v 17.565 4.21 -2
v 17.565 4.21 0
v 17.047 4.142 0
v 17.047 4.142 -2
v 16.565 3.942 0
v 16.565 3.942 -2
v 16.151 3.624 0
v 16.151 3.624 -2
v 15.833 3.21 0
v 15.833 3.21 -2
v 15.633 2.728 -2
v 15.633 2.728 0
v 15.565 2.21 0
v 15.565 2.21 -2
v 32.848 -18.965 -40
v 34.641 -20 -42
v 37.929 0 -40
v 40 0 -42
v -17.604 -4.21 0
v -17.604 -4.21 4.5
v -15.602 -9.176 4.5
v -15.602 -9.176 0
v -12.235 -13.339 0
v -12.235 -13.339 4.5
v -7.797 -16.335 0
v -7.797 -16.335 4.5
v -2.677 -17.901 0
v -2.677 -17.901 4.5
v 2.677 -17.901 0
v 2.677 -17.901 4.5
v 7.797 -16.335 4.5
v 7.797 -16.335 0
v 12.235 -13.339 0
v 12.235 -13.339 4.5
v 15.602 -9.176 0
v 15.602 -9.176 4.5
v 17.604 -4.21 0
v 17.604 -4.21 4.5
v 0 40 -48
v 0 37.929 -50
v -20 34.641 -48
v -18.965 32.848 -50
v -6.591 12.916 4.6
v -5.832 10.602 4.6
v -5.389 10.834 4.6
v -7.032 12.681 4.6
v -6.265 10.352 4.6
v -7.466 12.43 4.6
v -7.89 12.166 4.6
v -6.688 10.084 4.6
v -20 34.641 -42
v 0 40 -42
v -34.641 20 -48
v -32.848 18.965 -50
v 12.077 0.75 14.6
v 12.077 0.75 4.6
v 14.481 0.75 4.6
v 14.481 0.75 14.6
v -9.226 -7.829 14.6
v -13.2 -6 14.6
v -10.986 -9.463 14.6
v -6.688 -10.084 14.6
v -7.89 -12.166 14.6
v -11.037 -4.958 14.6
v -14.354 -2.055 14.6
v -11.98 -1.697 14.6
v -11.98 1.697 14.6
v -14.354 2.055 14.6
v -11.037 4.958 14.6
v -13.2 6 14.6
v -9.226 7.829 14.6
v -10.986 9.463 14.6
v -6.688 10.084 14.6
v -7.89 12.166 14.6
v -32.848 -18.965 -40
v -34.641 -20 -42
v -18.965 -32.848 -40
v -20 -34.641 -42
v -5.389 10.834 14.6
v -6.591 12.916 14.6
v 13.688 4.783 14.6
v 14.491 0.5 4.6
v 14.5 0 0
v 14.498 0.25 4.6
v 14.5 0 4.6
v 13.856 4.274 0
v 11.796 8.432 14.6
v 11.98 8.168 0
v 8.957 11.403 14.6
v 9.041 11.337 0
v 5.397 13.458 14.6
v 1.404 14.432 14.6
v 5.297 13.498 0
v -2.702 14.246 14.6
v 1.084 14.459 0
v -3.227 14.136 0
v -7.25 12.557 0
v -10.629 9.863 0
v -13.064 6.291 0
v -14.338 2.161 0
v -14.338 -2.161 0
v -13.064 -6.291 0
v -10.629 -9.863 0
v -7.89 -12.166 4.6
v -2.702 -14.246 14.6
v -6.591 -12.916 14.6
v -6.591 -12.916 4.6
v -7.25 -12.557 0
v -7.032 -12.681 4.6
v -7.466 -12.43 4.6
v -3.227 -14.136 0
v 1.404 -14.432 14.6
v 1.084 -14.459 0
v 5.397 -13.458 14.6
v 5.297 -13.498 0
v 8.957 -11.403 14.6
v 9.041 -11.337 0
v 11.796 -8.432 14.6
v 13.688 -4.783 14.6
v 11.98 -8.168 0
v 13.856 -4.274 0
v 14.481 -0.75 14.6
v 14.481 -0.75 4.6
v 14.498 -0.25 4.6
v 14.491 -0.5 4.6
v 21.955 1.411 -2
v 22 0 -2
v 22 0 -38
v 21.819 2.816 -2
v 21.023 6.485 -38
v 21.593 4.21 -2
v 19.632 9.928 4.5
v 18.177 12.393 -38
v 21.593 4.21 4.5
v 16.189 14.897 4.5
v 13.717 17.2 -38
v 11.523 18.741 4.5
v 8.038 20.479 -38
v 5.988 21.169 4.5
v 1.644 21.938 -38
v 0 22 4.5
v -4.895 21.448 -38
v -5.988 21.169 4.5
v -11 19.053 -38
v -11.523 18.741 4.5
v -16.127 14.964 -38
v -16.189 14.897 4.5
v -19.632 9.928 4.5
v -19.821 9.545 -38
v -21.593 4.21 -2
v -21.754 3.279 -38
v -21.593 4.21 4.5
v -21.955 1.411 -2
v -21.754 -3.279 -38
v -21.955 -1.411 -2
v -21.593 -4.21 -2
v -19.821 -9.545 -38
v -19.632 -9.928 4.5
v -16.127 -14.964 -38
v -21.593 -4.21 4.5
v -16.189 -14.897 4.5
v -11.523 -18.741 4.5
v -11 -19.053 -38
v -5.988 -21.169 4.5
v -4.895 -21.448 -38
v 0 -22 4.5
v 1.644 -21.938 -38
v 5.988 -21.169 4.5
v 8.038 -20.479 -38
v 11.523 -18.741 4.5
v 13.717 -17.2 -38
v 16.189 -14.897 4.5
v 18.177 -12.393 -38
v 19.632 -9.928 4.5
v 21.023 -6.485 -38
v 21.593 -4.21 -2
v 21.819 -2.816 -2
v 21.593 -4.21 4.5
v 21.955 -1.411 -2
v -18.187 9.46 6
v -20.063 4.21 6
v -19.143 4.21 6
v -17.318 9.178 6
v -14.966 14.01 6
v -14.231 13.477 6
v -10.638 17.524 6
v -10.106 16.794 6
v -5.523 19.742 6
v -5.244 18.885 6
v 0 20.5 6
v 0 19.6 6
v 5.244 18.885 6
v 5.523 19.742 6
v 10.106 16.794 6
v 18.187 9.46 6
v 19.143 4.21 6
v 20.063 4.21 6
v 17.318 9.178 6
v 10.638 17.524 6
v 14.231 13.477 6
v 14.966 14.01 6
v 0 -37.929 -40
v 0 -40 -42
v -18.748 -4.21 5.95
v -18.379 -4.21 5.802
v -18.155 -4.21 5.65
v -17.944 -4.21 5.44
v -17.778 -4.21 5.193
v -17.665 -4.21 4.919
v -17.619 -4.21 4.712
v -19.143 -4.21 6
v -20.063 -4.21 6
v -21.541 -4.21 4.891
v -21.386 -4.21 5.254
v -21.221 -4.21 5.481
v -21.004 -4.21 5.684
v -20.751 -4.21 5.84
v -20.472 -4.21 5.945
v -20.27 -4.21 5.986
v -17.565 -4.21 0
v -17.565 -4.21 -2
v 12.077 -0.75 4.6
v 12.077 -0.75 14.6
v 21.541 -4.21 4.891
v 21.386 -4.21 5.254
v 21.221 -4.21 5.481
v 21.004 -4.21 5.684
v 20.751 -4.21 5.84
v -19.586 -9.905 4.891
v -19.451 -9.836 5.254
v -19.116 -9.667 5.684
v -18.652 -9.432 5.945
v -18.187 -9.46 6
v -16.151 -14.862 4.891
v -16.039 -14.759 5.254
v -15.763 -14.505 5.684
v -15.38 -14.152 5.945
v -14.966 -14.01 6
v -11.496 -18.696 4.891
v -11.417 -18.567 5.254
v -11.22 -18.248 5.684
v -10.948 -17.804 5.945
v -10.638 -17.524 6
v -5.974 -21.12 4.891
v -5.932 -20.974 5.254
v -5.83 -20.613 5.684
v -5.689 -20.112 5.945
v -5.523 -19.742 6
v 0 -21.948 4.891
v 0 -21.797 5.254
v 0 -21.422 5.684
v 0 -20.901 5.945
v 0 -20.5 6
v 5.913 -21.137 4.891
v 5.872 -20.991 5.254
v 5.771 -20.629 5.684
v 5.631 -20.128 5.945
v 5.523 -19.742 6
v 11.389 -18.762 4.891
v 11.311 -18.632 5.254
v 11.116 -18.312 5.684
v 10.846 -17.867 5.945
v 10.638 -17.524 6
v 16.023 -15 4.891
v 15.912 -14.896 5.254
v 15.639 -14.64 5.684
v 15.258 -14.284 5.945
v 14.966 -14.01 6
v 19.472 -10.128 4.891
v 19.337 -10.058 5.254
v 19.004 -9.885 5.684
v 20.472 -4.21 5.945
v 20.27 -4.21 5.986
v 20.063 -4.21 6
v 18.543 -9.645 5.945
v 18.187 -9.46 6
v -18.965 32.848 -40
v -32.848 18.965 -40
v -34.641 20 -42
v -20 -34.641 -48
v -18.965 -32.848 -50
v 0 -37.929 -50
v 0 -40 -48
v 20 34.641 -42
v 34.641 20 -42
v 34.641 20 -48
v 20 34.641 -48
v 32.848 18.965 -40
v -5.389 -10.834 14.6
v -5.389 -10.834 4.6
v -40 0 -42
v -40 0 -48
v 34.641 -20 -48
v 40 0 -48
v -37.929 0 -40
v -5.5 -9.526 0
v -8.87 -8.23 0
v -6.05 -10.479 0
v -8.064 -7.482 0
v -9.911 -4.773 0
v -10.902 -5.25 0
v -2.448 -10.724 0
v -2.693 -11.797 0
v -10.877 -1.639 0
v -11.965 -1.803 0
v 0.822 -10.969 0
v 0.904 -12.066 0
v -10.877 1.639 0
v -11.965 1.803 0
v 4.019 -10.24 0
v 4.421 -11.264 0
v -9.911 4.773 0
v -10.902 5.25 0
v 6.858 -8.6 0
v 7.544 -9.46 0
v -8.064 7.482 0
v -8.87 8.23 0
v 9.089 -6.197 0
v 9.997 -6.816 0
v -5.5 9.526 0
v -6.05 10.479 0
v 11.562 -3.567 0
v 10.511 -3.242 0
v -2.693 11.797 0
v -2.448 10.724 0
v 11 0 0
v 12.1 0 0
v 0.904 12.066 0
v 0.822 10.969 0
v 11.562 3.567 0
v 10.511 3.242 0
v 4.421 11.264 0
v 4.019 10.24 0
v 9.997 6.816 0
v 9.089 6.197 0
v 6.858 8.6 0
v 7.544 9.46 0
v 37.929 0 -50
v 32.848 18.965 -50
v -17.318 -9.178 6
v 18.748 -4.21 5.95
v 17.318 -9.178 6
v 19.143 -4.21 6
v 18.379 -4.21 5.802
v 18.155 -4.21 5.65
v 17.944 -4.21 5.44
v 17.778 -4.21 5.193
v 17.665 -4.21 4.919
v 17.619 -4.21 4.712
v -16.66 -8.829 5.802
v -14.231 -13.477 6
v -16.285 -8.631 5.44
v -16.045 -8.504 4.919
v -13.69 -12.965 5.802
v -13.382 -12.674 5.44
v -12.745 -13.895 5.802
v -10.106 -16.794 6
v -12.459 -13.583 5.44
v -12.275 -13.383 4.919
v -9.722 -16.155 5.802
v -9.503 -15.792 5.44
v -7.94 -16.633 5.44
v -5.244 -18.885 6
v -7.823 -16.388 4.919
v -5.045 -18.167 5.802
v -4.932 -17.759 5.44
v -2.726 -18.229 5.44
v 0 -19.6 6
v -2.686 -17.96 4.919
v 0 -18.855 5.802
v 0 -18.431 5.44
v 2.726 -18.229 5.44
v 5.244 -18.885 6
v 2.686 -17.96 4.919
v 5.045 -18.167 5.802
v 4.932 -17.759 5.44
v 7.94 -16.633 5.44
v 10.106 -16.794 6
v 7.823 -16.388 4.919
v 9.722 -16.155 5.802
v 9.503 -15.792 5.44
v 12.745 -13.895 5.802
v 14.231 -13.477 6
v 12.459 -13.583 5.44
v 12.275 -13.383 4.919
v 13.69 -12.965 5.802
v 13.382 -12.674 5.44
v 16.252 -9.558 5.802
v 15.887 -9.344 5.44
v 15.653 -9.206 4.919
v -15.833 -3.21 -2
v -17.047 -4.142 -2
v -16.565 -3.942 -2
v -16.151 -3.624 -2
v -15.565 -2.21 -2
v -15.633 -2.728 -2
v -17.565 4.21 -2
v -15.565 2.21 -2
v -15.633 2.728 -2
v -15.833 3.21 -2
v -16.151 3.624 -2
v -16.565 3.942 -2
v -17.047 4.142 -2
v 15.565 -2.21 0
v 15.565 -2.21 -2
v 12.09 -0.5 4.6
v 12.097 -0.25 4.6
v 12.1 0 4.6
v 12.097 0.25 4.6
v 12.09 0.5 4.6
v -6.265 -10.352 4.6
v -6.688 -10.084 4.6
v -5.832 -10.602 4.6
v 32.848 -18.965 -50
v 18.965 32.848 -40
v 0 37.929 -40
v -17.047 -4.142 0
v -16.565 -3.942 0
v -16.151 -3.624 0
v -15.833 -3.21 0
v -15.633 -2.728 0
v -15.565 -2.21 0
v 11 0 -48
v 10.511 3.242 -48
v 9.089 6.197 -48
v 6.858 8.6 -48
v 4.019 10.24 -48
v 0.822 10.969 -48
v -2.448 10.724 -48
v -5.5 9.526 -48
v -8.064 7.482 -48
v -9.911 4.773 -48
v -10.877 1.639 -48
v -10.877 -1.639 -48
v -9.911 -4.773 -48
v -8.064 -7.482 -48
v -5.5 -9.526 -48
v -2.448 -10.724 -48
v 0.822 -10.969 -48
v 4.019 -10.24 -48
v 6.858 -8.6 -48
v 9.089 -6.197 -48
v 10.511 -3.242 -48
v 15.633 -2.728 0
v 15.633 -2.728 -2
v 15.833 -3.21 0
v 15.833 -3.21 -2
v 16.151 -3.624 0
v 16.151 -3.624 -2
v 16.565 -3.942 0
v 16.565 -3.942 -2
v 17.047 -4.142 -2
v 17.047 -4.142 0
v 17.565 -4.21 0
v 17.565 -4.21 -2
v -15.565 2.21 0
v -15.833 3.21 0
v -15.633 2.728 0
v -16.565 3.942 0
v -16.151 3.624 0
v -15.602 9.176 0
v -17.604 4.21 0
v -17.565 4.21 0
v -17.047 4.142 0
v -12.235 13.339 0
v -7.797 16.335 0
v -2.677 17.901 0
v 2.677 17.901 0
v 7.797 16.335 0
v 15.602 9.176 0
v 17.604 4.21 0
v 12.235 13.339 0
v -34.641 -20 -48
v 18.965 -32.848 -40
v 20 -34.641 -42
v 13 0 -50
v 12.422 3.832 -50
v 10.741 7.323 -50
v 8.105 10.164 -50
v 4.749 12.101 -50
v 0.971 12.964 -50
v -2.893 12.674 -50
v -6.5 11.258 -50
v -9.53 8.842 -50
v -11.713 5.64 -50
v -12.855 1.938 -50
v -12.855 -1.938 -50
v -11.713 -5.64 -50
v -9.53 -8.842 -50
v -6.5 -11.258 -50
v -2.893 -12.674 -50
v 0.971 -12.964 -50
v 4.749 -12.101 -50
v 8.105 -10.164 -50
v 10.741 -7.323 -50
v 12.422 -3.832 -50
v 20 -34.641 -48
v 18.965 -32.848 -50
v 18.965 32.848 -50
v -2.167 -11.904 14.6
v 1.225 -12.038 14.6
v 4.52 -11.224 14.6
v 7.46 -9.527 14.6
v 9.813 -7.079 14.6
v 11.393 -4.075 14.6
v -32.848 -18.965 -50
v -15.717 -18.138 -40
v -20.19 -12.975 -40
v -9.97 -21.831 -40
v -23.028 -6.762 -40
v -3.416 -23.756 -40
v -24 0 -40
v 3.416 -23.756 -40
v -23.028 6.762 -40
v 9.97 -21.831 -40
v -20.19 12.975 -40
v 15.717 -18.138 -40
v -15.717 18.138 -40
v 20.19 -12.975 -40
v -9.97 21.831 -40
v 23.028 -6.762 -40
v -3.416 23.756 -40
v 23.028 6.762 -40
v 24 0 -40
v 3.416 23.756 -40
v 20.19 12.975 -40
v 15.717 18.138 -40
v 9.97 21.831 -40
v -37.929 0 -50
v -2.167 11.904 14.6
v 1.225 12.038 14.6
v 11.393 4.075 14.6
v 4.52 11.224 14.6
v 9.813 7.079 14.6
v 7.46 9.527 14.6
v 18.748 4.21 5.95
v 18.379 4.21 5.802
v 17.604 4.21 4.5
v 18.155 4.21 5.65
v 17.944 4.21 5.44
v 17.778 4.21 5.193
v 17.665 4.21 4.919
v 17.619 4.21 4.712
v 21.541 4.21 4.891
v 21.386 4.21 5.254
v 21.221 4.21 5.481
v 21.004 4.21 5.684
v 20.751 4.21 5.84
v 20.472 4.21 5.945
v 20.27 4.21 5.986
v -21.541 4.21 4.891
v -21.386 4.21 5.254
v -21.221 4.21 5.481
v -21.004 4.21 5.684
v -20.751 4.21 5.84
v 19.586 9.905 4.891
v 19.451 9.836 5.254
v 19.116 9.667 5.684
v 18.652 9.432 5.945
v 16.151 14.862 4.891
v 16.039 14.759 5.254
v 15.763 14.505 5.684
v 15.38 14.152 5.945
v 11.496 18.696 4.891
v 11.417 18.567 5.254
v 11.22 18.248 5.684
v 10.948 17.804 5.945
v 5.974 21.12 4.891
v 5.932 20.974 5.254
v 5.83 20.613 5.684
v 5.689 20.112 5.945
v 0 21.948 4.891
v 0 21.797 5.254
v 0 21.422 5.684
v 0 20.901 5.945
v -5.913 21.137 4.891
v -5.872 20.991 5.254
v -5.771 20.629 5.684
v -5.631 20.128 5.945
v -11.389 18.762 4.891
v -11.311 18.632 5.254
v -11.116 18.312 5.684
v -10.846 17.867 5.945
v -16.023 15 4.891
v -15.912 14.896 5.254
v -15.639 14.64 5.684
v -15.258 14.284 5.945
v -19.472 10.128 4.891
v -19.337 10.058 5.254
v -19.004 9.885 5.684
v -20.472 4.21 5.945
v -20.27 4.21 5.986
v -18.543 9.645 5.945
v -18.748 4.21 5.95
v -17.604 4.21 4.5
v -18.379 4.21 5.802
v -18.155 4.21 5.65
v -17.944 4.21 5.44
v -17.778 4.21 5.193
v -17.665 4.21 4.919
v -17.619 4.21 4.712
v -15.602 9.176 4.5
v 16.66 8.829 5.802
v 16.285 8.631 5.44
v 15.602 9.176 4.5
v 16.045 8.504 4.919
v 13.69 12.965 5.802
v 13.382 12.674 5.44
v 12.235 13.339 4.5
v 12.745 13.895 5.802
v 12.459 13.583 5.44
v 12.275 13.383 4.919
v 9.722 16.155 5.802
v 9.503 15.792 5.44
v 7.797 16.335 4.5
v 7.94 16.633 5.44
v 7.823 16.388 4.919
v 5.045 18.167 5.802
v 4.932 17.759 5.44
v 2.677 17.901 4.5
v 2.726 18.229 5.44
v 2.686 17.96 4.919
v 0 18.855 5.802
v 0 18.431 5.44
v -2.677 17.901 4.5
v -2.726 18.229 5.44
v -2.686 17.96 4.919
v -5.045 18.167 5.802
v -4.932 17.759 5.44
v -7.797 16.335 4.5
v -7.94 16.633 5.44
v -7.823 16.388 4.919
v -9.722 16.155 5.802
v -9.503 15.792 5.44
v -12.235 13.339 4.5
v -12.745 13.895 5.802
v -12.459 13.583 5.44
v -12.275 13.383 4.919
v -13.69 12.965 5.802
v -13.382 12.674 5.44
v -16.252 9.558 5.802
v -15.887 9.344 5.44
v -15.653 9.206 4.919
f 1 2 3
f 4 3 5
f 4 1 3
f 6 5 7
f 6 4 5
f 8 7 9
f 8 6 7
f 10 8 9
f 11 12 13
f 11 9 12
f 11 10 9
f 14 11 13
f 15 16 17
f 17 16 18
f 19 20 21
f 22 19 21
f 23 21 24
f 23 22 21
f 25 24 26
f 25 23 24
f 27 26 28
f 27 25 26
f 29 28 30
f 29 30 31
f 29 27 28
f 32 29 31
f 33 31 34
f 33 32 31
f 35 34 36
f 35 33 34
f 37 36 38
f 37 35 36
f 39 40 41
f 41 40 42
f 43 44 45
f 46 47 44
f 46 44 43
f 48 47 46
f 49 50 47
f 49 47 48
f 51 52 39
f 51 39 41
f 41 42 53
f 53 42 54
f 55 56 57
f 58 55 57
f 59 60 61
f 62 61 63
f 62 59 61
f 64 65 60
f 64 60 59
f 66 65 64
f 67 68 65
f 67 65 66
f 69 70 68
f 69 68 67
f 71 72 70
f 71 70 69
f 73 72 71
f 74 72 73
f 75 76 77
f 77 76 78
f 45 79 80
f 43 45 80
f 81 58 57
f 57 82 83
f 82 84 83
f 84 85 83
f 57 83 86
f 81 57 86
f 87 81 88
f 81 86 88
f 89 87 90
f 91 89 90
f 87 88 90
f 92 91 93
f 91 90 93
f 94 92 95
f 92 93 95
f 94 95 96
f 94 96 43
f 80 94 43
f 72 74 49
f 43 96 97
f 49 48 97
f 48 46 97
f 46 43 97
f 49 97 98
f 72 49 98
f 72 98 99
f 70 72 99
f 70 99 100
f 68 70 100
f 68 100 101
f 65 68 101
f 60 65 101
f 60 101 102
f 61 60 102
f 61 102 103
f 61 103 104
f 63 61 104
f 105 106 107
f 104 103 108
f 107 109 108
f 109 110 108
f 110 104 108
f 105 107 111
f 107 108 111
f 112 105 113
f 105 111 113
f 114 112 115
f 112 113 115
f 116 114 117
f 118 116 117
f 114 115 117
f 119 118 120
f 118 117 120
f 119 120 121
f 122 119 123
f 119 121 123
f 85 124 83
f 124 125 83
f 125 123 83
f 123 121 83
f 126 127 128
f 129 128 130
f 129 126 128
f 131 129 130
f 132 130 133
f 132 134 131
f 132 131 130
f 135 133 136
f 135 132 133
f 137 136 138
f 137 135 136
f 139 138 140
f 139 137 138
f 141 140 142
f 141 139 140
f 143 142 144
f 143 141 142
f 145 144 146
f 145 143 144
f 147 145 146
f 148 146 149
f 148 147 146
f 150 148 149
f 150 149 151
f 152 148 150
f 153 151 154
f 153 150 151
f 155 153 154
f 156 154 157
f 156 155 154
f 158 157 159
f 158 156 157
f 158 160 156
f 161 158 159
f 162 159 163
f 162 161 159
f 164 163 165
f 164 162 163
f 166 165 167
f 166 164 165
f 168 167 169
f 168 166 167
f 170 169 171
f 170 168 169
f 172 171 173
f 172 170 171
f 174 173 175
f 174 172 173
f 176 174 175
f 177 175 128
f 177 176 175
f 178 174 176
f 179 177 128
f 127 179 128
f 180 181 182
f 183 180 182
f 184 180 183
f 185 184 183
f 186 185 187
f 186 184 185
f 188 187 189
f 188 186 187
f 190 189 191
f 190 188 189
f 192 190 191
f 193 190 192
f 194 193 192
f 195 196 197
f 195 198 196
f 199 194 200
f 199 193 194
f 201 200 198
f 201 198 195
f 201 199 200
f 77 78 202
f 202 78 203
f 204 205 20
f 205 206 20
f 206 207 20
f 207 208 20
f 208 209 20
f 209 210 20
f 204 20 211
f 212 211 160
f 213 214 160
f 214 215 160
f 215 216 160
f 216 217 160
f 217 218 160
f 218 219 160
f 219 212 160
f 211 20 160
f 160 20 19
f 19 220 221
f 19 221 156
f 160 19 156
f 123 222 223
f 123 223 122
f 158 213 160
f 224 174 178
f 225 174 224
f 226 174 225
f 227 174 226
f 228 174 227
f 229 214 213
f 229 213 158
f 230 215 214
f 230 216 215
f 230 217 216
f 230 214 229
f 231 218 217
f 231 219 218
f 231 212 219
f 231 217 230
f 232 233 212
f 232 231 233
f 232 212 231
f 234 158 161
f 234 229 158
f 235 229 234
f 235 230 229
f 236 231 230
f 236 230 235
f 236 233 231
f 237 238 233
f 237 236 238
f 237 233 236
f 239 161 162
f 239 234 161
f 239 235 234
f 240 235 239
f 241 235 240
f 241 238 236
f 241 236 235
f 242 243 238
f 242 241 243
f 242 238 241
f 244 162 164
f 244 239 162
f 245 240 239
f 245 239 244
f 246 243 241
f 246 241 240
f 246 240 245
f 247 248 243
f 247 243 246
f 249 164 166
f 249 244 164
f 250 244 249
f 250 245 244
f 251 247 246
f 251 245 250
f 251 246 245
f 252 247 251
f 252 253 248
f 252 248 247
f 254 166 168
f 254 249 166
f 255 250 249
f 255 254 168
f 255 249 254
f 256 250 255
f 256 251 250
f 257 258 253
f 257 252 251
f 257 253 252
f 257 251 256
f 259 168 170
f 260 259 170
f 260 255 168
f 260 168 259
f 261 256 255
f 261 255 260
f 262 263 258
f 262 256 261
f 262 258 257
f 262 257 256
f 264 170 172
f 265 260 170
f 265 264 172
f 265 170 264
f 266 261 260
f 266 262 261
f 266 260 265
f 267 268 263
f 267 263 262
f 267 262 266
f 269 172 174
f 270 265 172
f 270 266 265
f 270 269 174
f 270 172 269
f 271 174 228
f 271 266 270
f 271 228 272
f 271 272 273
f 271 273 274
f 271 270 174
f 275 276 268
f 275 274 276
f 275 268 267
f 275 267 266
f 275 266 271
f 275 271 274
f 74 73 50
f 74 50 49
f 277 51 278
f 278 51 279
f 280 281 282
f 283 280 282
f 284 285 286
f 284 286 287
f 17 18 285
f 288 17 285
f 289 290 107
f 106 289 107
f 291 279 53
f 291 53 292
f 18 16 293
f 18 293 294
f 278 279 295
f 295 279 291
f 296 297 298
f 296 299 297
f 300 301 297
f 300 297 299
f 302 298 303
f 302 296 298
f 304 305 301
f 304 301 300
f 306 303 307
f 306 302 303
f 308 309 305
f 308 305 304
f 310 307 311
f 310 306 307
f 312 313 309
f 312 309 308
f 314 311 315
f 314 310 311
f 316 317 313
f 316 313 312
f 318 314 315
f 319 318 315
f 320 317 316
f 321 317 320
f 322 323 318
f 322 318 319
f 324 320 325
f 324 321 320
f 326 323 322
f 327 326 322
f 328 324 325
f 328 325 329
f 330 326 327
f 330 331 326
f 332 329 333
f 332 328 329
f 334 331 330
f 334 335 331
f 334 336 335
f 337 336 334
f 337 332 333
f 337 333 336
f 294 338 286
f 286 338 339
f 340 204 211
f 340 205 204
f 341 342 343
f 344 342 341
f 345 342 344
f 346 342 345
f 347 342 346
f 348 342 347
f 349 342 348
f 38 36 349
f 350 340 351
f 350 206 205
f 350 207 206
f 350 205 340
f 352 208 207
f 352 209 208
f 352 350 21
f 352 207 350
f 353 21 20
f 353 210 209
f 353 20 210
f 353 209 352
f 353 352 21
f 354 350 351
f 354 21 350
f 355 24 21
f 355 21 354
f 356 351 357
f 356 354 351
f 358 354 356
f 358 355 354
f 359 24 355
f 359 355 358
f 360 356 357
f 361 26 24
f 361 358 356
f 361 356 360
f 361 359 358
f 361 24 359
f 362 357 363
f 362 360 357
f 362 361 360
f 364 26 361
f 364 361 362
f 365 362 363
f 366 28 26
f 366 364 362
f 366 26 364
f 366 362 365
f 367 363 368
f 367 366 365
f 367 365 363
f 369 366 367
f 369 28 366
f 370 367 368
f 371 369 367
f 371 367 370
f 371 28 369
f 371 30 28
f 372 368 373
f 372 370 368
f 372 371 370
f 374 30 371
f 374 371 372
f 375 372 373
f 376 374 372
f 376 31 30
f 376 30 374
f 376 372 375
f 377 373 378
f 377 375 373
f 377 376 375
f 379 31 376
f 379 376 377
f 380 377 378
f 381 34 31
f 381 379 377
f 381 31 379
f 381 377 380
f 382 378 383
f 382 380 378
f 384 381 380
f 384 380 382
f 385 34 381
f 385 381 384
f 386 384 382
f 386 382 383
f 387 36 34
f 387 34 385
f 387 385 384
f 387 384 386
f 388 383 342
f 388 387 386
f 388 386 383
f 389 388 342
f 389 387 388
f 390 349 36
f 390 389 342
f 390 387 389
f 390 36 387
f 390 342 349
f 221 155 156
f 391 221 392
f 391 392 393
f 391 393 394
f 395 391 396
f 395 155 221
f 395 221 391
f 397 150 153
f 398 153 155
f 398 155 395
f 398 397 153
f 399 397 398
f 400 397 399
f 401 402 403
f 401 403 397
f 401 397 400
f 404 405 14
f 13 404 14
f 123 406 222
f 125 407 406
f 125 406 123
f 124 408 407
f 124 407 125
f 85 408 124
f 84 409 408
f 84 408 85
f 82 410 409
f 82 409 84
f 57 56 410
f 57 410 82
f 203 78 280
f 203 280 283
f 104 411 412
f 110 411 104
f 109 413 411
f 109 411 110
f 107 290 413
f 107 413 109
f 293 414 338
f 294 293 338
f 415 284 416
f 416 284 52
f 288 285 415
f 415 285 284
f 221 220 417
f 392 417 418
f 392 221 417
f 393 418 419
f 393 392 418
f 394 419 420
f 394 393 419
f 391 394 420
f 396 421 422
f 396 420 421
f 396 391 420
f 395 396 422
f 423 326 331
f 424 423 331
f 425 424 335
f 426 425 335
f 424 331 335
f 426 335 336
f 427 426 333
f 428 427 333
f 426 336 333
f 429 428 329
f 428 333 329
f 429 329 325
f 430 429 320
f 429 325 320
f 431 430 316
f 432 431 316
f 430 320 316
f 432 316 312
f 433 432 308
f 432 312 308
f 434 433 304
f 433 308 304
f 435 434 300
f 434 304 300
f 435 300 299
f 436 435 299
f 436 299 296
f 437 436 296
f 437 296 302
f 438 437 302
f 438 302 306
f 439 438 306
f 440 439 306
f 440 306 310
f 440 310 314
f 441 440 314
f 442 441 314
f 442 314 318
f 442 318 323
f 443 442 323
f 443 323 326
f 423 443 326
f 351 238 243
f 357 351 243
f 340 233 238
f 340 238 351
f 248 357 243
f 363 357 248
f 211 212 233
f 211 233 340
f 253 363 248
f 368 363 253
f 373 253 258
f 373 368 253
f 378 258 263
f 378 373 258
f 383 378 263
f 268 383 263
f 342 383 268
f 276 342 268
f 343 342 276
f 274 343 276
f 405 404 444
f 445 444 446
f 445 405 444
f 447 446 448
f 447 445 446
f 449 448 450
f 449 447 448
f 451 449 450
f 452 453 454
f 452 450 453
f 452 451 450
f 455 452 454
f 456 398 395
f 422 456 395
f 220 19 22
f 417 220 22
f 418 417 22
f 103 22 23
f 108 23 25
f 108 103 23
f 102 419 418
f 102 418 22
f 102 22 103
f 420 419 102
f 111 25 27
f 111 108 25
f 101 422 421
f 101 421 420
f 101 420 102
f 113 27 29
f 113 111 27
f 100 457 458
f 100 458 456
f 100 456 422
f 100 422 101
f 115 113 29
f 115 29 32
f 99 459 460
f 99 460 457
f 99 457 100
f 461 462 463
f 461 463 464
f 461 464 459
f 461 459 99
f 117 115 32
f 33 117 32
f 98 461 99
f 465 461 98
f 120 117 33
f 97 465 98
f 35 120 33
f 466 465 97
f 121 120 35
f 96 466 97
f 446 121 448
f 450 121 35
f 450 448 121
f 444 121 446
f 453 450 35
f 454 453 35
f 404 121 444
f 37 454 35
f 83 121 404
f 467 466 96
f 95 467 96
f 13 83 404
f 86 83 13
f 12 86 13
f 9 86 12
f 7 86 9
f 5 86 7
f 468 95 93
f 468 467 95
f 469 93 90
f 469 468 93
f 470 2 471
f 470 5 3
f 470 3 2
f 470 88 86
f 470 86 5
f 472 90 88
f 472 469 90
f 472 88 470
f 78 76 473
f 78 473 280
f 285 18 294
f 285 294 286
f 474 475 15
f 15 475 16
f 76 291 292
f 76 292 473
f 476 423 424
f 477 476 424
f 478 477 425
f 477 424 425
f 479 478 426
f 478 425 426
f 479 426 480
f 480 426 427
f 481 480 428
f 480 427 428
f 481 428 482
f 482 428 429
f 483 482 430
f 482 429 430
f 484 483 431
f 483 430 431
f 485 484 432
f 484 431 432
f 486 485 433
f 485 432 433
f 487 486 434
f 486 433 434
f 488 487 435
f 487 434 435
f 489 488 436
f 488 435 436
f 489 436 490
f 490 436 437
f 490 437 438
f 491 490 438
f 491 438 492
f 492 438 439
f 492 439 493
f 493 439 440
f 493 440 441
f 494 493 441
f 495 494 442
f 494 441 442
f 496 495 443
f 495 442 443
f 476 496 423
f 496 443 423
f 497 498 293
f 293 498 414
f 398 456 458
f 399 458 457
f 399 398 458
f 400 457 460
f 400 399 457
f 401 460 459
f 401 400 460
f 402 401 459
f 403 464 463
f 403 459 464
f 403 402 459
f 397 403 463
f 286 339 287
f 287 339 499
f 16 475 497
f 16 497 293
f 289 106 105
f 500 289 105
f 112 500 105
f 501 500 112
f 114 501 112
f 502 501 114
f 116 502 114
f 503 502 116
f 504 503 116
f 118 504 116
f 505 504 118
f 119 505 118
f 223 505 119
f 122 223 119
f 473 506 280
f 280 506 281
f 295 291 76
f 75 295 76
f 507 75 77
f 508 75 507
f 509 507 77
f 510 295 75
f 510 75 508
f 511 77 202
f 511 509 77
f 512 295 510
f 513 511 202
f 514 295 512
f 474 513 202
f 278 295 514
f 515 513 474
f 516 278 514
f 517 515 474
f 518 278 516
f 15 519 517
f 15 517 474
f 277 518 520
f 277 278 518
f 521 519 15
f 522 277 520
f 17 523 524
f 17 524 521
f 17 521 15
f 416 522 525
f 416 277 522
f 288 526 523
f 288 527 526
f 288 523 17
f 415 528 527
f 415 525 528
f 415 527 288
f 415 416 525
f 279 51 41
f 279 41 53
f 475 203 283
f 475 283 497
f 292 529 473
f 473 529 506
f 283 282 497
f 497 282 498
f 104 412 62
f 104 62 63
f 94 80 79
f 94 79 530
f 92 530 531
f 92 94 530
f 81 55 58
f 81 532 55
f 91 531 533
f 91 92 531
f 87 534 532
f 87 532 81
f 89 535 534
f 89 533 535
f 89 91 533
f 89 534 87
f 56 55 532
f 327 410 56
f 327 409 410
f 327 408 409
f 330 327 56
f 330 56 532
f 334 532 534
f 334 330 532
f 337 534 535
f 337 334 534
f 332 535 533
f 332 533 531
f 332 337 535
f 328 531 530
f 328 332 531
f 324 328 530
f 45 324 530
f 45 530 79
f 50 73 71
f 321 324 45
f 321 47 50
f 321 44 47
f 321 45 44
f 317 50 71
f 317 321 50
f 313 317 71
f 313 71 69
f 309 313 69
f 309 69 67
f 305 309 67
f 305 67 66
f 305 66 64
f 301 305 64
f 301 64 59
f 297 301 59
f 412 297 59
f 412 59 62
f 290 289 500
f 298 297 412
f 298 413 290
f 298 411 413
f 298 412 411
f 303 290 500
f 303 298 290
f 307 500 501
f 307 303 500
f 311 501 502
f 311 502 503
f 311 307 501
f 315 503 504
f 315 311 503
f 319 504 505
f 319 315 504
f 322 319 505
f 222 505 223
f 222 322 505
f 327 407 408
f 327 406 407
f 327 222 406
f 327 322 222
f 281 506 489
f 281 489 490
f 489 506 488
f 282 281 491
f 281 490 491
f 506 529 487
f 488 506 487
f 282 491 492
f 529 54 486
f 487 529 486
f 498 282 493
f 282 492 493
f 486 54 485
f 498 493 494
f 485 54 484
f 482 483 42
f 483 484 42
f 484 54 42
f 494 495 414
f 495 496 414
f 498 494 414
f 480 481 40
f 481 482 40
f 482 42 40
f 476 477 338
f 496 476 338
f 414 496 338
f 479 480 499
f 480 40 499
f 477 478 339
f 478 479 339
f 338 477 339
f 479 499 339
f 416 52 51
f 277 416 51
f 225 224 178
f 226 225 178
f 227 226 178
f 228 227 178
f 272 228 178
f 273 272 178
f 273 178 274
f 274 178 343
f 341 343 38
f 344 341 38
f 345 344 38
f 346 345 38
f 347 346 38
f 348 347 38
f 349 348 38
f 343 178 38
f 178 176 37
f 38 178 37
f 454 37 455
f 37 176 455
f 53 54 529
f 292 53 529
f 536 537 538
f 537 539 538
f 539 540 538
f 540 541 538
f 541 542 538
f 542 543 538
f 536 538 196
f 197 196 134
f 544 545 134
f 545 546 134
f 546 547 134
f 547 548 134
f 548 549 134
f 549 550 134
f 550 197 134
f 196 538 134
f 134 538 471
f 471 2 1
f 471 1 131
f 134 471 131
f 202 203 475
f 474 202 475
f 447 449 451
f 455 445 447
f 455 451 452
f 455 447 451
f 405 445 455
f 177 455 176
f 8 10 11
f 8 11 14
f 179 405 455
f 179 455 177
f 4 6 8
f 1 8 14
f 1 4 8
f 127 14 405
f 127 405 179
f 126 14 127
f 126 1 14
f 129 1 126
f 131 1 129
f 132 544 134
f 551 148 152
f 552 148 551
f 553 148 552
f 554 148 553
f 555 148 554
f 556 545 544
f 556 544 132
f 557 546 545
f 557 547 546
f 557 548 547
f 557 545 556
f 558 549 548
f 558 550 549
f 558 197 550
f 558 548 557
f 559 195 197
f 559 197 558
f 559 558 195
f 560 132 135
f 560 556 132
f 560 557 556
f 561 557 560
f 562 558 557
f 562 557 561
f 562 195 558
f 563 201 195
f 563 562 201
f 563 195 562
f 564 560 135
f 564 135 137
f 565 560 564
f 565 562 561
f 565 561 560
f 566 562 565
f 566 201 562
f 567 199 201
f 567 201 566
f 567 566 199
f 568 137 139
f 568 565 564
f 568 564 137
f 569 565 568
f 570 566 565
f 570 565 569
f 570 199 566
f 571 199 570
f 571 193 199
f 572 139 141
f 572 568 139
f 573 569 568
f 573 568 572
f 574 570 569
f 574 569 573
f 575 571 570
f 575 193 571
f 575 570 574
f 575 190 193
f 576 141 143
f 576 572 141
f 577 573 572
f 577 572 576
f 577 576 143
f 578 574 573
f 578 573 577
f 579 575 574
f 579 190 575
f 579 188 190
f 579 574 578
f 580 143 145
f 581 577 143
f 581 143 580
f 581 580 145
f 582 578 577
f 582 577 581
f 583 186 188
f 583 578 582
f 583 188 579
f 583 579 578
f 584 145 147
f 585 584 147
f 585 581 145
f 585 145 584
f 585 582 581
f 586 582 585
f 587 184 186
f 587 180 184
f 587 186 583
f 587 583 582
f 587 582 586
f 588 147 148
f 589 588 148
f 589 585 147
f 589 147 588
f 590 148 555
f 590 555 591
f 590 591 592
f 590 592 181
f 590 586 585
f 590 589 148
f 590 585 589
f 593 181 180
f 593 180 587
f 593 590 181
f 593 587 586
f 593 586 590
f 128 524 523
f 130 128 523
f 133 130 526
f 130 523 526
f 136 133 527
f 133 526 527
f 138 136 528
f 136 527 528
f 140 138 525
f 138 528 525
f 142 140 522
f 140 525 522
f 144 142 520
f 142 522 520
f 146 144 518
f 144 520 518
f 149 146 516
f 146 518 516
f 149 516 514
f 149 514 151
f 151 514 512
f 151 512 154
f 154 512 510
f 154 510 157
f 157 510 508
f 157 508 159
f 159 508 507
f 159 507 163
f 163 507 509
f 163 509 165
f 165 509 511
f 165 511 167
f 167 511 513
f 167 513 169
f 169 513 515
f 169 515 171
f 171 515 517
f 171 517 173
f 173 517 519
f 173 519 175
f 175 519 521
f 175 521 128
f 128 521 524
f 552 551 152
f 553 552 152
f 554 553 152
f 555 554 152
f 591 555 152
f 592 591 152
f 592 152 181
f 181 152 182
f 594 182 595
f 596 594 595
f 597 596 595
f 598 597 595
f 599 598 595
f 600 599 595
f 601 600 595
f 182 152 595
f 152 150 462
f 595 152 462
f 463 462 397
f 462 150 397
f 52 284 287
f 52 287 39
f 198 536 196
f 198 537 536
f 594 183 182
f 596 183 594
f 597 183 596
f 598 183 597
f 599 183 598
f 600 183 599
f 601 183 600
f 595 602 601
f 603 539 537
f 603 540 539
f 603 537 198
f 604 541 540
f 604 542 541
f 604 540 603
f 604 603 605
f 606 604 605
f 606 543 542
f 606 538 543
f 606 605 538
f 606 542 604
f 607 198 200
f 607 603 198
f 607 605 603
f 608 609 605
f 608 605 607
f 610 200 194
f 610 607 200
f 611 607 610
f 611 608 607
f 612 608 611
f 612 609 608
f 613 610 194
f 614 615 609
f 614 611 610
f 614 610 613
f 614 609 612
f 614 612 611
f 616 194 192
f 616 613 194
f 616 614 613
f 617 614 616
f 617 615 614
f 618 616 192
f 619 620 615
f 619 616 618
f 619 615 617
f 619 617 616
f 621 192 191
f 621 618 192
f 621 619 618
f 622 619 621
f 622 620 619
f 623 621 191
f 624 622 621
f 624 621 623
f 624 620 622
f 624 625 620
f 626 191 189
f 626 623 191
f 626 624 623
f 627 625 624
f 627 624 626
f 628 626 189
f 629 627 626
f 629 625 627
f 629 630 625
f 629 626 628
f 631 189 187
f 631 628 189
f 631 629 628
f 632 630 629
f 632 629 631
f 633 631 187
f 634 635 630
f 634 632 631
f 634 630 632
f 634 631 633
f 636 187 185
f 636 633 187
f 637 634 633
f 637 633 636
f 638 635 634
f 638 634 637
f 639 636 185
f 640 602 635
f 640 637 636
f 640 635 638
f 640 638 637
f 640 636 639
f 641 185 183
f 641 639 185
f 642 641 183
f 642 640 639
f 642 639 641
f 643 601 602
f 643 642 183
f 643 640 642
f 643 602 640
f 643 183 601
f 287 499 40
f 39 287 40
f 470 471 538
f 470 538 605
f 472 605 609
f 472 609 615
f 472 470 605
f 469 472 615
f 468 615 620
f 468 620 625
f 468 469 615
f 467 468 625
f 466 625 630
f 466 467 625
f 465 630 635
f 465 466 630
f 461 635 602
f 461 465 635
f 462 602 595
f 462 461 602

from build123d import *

# Parameters (mm, degrees)
SKETCH_R             = 14.5
SKETCH_R_2           = 12.1
PAD_DEPTH            = 14.6
SKETCH001_W          = 30.380329
SKETCH001_H          = 1.5
POCKET_DEPTH         = 97.067871
POLARPATTERN_COUNT   = 3
SKETCH003_R          = 22
PAD001_DEPTH         = 40
SKETCH004_R          = 22
SKETCH004_R_2        = 18.1
PAD002_DEPTH         = 6
PAD003_DEPTH         = 10
SKETCH005_R          = 11
POCKET001_DEPTH      = 50.001
POCKET001_DEPTH_BACK = 14.601
FILLET_R             = 1.5
POCKET002_DEPTH      = 16.601
CHAMFER_SIZE         = 2


with BuildPart() as part:
    # Sketch → Pad (new body)
    with BuildSketch(Plane.XY):
        Circle(SKETCH_R)
        Circle(SKETCH_R_2, mode=Mode.SUBTRACT)
    extrude(amount=PAD_DEPTH)

    # Sketch001 → Pocket (cut, through all)
    with BuildSketch(Plane.XY.offset(4.6)):
        with Locations((15.190164, 0)):
            Rectangle(SKETCH001_W, SKETCH001_H)
    pocket = extrude(amount=POCKET_DEPTH, mode=Mode.SUBTRACT)

    # PolarPattern: Pocket ×3 about axis
    polarpattern_axis = Axis((0, 0, 4.6), (0, 0, 1))
    for i in range(1, POLARPATTERN_COUNT):
        add(pocket.rotate(polarpattern_axis, i * 360 / POLARPATTERN_COUNT), mode=Mode.SUBTRACT)

    # Sketch003 → Pad001 (join)
    with BuildSketch(Plane.XY):
        Circle(SKETCH003_R)
    extrude(amount=-PAD001_DEPTH)

    # Sketch004 → Pad002 (join)
    with BuildSketch(Plane.XY):
        Circle(SKETCH004_R)
        Circle(SKETCH004_R_2, mode=Mode.SUBTRACT)
    extrude(amount=PAD002_DEPTH)

    # Sketch002 → Pad003 (join)
    with BuildSketch(Plane.XY.offset(-40)):
        Polygon((20, -34.641016), (34.641016, -20), (40, 0), (34.641016, 20), (20, 34.641016), (0, 40), (-20, 34.641016), (-34.641016, 20), (-40, 0), (-34.641016, -20), (-20, -34.641016), (0, -40), align=None)
    extrude(amount=-PAD003_DEPTH)

    # Sketch005 → Pocket001 (cut, two sides)
    with BuildSketch(Plane.XY) as pocket001_sk:
        Circle(SKETCH005_R)
    extrude(amount=-POCKET001_DEPTH, mode=Mode.SUBTRACT)
    extrude(pocket001_sk.sketch, amount=POCKET001_DEPTH_BACK, mode=Mode.SUBTRACT)

    # Fillet
    fillet_edges = [part.edges().sort_by_distance(p)[0] for p in [
        (-22, 0, 6),
        (-18.1, 0, 6),
    ]]
    fillet(fillet_edges, radius=FILLET_R)

    # Sketch006 → Pocket002 (cut, through all)
    with BuildSketch(Plane.XY.offset(-2)):
        with BuildLine():
            ThreePointArc((17.565, 4.21), (16.150786, 3.624214), (15.565, 2.21))
            Line((15.565, -2.21), (15.565, 2.21))
            ThreePointArc((15.565, -2.21), (16.150786, -3.624214), (17.565, -4.21))
            Line((34.147769, -4.21), (17.565, -4.21))
            ThreePointArc((34.147769, -4.21), (35.561983, -3.624214), (36.147769, -2.21))
            Line((36.147769, 2.21), (36.147769, -2.21))
            ThreePointArc((36.147769, 2.21), (35.561983, 3.624214), (34.147769, 4.21))
            Line((17.565, 4.21), (34.147769, 4.21))
        make_face()
        with BuildLine():
            ThreePointArc((-49.927467, 4.21), (-51.34168, 3.624214), (-51.927467, 2.21))
            Line((-51.927467, -2.21), (-51.927467, 2.21))
            ThreePointArc((-51.927467, -2.21), (-51.34168, -3.624214), (-49.927467, -4.21))
            Line((-17.565, -4.21), (-49.927467, -4.21))
            ThreePointArc((-17.565, -4.21), (-16.150786, -3.624214), (-15.565, -2.21))
            Line((-15.565, 2.21), (-15.565, -2.21))
            ThreePointArc((-15.565, 2.21), (-16.150786, 3.624214), (-17.565, 4.21))
            Line((-49.927467, 4.21), (-17.565, 4.21))
        make_face()
    extrude(amount=POCKET002_DEPTH, mode=Mode.SUBTRACT)

    # Chamfer
    chamfer_edges = [part.edges().sort_by_distance(p)[0] for p in [
        (27.320508, -27.320508, -50),
        (10, -37.320508, -50),
        (37.320508, -10, -50),
        (-10, -37.320508, -50),
        (37.320508, 10, -50),
        (-27.320508, -27.320508, -50),
        (27.320508, 27.320508, -50),
        (-37.320508, -10, -50),
        (10, 37.320508, -50),
        (-37.320508, 10, -50),
        (-10, 37.320508, -50),
        (-27.320508, 27.320508, -50),
        (-11, 0, -50),
        (27.320508, -27.320508, -40),
        (10, -37.320508, -40),
        (37.320508, -10, -40),
        (-10, -37.320508, -40),
        (37.320508, 10, -40),
        (-27.320508, -27.320508, -40),
        (27.320508, 27.320508, -40),
        (-37.320508, -10, -40),
        (10, 37.320508, -40),
        (-37.320508, 10, -40),
        (-10, 37.320508, -40),
        (-27.320508, 27.320508, -40),
        (-22, 0, -40),
    ]]
    chamfer(chamfer_edges, length=CHAMFER_SIZE)


solid = part.part
